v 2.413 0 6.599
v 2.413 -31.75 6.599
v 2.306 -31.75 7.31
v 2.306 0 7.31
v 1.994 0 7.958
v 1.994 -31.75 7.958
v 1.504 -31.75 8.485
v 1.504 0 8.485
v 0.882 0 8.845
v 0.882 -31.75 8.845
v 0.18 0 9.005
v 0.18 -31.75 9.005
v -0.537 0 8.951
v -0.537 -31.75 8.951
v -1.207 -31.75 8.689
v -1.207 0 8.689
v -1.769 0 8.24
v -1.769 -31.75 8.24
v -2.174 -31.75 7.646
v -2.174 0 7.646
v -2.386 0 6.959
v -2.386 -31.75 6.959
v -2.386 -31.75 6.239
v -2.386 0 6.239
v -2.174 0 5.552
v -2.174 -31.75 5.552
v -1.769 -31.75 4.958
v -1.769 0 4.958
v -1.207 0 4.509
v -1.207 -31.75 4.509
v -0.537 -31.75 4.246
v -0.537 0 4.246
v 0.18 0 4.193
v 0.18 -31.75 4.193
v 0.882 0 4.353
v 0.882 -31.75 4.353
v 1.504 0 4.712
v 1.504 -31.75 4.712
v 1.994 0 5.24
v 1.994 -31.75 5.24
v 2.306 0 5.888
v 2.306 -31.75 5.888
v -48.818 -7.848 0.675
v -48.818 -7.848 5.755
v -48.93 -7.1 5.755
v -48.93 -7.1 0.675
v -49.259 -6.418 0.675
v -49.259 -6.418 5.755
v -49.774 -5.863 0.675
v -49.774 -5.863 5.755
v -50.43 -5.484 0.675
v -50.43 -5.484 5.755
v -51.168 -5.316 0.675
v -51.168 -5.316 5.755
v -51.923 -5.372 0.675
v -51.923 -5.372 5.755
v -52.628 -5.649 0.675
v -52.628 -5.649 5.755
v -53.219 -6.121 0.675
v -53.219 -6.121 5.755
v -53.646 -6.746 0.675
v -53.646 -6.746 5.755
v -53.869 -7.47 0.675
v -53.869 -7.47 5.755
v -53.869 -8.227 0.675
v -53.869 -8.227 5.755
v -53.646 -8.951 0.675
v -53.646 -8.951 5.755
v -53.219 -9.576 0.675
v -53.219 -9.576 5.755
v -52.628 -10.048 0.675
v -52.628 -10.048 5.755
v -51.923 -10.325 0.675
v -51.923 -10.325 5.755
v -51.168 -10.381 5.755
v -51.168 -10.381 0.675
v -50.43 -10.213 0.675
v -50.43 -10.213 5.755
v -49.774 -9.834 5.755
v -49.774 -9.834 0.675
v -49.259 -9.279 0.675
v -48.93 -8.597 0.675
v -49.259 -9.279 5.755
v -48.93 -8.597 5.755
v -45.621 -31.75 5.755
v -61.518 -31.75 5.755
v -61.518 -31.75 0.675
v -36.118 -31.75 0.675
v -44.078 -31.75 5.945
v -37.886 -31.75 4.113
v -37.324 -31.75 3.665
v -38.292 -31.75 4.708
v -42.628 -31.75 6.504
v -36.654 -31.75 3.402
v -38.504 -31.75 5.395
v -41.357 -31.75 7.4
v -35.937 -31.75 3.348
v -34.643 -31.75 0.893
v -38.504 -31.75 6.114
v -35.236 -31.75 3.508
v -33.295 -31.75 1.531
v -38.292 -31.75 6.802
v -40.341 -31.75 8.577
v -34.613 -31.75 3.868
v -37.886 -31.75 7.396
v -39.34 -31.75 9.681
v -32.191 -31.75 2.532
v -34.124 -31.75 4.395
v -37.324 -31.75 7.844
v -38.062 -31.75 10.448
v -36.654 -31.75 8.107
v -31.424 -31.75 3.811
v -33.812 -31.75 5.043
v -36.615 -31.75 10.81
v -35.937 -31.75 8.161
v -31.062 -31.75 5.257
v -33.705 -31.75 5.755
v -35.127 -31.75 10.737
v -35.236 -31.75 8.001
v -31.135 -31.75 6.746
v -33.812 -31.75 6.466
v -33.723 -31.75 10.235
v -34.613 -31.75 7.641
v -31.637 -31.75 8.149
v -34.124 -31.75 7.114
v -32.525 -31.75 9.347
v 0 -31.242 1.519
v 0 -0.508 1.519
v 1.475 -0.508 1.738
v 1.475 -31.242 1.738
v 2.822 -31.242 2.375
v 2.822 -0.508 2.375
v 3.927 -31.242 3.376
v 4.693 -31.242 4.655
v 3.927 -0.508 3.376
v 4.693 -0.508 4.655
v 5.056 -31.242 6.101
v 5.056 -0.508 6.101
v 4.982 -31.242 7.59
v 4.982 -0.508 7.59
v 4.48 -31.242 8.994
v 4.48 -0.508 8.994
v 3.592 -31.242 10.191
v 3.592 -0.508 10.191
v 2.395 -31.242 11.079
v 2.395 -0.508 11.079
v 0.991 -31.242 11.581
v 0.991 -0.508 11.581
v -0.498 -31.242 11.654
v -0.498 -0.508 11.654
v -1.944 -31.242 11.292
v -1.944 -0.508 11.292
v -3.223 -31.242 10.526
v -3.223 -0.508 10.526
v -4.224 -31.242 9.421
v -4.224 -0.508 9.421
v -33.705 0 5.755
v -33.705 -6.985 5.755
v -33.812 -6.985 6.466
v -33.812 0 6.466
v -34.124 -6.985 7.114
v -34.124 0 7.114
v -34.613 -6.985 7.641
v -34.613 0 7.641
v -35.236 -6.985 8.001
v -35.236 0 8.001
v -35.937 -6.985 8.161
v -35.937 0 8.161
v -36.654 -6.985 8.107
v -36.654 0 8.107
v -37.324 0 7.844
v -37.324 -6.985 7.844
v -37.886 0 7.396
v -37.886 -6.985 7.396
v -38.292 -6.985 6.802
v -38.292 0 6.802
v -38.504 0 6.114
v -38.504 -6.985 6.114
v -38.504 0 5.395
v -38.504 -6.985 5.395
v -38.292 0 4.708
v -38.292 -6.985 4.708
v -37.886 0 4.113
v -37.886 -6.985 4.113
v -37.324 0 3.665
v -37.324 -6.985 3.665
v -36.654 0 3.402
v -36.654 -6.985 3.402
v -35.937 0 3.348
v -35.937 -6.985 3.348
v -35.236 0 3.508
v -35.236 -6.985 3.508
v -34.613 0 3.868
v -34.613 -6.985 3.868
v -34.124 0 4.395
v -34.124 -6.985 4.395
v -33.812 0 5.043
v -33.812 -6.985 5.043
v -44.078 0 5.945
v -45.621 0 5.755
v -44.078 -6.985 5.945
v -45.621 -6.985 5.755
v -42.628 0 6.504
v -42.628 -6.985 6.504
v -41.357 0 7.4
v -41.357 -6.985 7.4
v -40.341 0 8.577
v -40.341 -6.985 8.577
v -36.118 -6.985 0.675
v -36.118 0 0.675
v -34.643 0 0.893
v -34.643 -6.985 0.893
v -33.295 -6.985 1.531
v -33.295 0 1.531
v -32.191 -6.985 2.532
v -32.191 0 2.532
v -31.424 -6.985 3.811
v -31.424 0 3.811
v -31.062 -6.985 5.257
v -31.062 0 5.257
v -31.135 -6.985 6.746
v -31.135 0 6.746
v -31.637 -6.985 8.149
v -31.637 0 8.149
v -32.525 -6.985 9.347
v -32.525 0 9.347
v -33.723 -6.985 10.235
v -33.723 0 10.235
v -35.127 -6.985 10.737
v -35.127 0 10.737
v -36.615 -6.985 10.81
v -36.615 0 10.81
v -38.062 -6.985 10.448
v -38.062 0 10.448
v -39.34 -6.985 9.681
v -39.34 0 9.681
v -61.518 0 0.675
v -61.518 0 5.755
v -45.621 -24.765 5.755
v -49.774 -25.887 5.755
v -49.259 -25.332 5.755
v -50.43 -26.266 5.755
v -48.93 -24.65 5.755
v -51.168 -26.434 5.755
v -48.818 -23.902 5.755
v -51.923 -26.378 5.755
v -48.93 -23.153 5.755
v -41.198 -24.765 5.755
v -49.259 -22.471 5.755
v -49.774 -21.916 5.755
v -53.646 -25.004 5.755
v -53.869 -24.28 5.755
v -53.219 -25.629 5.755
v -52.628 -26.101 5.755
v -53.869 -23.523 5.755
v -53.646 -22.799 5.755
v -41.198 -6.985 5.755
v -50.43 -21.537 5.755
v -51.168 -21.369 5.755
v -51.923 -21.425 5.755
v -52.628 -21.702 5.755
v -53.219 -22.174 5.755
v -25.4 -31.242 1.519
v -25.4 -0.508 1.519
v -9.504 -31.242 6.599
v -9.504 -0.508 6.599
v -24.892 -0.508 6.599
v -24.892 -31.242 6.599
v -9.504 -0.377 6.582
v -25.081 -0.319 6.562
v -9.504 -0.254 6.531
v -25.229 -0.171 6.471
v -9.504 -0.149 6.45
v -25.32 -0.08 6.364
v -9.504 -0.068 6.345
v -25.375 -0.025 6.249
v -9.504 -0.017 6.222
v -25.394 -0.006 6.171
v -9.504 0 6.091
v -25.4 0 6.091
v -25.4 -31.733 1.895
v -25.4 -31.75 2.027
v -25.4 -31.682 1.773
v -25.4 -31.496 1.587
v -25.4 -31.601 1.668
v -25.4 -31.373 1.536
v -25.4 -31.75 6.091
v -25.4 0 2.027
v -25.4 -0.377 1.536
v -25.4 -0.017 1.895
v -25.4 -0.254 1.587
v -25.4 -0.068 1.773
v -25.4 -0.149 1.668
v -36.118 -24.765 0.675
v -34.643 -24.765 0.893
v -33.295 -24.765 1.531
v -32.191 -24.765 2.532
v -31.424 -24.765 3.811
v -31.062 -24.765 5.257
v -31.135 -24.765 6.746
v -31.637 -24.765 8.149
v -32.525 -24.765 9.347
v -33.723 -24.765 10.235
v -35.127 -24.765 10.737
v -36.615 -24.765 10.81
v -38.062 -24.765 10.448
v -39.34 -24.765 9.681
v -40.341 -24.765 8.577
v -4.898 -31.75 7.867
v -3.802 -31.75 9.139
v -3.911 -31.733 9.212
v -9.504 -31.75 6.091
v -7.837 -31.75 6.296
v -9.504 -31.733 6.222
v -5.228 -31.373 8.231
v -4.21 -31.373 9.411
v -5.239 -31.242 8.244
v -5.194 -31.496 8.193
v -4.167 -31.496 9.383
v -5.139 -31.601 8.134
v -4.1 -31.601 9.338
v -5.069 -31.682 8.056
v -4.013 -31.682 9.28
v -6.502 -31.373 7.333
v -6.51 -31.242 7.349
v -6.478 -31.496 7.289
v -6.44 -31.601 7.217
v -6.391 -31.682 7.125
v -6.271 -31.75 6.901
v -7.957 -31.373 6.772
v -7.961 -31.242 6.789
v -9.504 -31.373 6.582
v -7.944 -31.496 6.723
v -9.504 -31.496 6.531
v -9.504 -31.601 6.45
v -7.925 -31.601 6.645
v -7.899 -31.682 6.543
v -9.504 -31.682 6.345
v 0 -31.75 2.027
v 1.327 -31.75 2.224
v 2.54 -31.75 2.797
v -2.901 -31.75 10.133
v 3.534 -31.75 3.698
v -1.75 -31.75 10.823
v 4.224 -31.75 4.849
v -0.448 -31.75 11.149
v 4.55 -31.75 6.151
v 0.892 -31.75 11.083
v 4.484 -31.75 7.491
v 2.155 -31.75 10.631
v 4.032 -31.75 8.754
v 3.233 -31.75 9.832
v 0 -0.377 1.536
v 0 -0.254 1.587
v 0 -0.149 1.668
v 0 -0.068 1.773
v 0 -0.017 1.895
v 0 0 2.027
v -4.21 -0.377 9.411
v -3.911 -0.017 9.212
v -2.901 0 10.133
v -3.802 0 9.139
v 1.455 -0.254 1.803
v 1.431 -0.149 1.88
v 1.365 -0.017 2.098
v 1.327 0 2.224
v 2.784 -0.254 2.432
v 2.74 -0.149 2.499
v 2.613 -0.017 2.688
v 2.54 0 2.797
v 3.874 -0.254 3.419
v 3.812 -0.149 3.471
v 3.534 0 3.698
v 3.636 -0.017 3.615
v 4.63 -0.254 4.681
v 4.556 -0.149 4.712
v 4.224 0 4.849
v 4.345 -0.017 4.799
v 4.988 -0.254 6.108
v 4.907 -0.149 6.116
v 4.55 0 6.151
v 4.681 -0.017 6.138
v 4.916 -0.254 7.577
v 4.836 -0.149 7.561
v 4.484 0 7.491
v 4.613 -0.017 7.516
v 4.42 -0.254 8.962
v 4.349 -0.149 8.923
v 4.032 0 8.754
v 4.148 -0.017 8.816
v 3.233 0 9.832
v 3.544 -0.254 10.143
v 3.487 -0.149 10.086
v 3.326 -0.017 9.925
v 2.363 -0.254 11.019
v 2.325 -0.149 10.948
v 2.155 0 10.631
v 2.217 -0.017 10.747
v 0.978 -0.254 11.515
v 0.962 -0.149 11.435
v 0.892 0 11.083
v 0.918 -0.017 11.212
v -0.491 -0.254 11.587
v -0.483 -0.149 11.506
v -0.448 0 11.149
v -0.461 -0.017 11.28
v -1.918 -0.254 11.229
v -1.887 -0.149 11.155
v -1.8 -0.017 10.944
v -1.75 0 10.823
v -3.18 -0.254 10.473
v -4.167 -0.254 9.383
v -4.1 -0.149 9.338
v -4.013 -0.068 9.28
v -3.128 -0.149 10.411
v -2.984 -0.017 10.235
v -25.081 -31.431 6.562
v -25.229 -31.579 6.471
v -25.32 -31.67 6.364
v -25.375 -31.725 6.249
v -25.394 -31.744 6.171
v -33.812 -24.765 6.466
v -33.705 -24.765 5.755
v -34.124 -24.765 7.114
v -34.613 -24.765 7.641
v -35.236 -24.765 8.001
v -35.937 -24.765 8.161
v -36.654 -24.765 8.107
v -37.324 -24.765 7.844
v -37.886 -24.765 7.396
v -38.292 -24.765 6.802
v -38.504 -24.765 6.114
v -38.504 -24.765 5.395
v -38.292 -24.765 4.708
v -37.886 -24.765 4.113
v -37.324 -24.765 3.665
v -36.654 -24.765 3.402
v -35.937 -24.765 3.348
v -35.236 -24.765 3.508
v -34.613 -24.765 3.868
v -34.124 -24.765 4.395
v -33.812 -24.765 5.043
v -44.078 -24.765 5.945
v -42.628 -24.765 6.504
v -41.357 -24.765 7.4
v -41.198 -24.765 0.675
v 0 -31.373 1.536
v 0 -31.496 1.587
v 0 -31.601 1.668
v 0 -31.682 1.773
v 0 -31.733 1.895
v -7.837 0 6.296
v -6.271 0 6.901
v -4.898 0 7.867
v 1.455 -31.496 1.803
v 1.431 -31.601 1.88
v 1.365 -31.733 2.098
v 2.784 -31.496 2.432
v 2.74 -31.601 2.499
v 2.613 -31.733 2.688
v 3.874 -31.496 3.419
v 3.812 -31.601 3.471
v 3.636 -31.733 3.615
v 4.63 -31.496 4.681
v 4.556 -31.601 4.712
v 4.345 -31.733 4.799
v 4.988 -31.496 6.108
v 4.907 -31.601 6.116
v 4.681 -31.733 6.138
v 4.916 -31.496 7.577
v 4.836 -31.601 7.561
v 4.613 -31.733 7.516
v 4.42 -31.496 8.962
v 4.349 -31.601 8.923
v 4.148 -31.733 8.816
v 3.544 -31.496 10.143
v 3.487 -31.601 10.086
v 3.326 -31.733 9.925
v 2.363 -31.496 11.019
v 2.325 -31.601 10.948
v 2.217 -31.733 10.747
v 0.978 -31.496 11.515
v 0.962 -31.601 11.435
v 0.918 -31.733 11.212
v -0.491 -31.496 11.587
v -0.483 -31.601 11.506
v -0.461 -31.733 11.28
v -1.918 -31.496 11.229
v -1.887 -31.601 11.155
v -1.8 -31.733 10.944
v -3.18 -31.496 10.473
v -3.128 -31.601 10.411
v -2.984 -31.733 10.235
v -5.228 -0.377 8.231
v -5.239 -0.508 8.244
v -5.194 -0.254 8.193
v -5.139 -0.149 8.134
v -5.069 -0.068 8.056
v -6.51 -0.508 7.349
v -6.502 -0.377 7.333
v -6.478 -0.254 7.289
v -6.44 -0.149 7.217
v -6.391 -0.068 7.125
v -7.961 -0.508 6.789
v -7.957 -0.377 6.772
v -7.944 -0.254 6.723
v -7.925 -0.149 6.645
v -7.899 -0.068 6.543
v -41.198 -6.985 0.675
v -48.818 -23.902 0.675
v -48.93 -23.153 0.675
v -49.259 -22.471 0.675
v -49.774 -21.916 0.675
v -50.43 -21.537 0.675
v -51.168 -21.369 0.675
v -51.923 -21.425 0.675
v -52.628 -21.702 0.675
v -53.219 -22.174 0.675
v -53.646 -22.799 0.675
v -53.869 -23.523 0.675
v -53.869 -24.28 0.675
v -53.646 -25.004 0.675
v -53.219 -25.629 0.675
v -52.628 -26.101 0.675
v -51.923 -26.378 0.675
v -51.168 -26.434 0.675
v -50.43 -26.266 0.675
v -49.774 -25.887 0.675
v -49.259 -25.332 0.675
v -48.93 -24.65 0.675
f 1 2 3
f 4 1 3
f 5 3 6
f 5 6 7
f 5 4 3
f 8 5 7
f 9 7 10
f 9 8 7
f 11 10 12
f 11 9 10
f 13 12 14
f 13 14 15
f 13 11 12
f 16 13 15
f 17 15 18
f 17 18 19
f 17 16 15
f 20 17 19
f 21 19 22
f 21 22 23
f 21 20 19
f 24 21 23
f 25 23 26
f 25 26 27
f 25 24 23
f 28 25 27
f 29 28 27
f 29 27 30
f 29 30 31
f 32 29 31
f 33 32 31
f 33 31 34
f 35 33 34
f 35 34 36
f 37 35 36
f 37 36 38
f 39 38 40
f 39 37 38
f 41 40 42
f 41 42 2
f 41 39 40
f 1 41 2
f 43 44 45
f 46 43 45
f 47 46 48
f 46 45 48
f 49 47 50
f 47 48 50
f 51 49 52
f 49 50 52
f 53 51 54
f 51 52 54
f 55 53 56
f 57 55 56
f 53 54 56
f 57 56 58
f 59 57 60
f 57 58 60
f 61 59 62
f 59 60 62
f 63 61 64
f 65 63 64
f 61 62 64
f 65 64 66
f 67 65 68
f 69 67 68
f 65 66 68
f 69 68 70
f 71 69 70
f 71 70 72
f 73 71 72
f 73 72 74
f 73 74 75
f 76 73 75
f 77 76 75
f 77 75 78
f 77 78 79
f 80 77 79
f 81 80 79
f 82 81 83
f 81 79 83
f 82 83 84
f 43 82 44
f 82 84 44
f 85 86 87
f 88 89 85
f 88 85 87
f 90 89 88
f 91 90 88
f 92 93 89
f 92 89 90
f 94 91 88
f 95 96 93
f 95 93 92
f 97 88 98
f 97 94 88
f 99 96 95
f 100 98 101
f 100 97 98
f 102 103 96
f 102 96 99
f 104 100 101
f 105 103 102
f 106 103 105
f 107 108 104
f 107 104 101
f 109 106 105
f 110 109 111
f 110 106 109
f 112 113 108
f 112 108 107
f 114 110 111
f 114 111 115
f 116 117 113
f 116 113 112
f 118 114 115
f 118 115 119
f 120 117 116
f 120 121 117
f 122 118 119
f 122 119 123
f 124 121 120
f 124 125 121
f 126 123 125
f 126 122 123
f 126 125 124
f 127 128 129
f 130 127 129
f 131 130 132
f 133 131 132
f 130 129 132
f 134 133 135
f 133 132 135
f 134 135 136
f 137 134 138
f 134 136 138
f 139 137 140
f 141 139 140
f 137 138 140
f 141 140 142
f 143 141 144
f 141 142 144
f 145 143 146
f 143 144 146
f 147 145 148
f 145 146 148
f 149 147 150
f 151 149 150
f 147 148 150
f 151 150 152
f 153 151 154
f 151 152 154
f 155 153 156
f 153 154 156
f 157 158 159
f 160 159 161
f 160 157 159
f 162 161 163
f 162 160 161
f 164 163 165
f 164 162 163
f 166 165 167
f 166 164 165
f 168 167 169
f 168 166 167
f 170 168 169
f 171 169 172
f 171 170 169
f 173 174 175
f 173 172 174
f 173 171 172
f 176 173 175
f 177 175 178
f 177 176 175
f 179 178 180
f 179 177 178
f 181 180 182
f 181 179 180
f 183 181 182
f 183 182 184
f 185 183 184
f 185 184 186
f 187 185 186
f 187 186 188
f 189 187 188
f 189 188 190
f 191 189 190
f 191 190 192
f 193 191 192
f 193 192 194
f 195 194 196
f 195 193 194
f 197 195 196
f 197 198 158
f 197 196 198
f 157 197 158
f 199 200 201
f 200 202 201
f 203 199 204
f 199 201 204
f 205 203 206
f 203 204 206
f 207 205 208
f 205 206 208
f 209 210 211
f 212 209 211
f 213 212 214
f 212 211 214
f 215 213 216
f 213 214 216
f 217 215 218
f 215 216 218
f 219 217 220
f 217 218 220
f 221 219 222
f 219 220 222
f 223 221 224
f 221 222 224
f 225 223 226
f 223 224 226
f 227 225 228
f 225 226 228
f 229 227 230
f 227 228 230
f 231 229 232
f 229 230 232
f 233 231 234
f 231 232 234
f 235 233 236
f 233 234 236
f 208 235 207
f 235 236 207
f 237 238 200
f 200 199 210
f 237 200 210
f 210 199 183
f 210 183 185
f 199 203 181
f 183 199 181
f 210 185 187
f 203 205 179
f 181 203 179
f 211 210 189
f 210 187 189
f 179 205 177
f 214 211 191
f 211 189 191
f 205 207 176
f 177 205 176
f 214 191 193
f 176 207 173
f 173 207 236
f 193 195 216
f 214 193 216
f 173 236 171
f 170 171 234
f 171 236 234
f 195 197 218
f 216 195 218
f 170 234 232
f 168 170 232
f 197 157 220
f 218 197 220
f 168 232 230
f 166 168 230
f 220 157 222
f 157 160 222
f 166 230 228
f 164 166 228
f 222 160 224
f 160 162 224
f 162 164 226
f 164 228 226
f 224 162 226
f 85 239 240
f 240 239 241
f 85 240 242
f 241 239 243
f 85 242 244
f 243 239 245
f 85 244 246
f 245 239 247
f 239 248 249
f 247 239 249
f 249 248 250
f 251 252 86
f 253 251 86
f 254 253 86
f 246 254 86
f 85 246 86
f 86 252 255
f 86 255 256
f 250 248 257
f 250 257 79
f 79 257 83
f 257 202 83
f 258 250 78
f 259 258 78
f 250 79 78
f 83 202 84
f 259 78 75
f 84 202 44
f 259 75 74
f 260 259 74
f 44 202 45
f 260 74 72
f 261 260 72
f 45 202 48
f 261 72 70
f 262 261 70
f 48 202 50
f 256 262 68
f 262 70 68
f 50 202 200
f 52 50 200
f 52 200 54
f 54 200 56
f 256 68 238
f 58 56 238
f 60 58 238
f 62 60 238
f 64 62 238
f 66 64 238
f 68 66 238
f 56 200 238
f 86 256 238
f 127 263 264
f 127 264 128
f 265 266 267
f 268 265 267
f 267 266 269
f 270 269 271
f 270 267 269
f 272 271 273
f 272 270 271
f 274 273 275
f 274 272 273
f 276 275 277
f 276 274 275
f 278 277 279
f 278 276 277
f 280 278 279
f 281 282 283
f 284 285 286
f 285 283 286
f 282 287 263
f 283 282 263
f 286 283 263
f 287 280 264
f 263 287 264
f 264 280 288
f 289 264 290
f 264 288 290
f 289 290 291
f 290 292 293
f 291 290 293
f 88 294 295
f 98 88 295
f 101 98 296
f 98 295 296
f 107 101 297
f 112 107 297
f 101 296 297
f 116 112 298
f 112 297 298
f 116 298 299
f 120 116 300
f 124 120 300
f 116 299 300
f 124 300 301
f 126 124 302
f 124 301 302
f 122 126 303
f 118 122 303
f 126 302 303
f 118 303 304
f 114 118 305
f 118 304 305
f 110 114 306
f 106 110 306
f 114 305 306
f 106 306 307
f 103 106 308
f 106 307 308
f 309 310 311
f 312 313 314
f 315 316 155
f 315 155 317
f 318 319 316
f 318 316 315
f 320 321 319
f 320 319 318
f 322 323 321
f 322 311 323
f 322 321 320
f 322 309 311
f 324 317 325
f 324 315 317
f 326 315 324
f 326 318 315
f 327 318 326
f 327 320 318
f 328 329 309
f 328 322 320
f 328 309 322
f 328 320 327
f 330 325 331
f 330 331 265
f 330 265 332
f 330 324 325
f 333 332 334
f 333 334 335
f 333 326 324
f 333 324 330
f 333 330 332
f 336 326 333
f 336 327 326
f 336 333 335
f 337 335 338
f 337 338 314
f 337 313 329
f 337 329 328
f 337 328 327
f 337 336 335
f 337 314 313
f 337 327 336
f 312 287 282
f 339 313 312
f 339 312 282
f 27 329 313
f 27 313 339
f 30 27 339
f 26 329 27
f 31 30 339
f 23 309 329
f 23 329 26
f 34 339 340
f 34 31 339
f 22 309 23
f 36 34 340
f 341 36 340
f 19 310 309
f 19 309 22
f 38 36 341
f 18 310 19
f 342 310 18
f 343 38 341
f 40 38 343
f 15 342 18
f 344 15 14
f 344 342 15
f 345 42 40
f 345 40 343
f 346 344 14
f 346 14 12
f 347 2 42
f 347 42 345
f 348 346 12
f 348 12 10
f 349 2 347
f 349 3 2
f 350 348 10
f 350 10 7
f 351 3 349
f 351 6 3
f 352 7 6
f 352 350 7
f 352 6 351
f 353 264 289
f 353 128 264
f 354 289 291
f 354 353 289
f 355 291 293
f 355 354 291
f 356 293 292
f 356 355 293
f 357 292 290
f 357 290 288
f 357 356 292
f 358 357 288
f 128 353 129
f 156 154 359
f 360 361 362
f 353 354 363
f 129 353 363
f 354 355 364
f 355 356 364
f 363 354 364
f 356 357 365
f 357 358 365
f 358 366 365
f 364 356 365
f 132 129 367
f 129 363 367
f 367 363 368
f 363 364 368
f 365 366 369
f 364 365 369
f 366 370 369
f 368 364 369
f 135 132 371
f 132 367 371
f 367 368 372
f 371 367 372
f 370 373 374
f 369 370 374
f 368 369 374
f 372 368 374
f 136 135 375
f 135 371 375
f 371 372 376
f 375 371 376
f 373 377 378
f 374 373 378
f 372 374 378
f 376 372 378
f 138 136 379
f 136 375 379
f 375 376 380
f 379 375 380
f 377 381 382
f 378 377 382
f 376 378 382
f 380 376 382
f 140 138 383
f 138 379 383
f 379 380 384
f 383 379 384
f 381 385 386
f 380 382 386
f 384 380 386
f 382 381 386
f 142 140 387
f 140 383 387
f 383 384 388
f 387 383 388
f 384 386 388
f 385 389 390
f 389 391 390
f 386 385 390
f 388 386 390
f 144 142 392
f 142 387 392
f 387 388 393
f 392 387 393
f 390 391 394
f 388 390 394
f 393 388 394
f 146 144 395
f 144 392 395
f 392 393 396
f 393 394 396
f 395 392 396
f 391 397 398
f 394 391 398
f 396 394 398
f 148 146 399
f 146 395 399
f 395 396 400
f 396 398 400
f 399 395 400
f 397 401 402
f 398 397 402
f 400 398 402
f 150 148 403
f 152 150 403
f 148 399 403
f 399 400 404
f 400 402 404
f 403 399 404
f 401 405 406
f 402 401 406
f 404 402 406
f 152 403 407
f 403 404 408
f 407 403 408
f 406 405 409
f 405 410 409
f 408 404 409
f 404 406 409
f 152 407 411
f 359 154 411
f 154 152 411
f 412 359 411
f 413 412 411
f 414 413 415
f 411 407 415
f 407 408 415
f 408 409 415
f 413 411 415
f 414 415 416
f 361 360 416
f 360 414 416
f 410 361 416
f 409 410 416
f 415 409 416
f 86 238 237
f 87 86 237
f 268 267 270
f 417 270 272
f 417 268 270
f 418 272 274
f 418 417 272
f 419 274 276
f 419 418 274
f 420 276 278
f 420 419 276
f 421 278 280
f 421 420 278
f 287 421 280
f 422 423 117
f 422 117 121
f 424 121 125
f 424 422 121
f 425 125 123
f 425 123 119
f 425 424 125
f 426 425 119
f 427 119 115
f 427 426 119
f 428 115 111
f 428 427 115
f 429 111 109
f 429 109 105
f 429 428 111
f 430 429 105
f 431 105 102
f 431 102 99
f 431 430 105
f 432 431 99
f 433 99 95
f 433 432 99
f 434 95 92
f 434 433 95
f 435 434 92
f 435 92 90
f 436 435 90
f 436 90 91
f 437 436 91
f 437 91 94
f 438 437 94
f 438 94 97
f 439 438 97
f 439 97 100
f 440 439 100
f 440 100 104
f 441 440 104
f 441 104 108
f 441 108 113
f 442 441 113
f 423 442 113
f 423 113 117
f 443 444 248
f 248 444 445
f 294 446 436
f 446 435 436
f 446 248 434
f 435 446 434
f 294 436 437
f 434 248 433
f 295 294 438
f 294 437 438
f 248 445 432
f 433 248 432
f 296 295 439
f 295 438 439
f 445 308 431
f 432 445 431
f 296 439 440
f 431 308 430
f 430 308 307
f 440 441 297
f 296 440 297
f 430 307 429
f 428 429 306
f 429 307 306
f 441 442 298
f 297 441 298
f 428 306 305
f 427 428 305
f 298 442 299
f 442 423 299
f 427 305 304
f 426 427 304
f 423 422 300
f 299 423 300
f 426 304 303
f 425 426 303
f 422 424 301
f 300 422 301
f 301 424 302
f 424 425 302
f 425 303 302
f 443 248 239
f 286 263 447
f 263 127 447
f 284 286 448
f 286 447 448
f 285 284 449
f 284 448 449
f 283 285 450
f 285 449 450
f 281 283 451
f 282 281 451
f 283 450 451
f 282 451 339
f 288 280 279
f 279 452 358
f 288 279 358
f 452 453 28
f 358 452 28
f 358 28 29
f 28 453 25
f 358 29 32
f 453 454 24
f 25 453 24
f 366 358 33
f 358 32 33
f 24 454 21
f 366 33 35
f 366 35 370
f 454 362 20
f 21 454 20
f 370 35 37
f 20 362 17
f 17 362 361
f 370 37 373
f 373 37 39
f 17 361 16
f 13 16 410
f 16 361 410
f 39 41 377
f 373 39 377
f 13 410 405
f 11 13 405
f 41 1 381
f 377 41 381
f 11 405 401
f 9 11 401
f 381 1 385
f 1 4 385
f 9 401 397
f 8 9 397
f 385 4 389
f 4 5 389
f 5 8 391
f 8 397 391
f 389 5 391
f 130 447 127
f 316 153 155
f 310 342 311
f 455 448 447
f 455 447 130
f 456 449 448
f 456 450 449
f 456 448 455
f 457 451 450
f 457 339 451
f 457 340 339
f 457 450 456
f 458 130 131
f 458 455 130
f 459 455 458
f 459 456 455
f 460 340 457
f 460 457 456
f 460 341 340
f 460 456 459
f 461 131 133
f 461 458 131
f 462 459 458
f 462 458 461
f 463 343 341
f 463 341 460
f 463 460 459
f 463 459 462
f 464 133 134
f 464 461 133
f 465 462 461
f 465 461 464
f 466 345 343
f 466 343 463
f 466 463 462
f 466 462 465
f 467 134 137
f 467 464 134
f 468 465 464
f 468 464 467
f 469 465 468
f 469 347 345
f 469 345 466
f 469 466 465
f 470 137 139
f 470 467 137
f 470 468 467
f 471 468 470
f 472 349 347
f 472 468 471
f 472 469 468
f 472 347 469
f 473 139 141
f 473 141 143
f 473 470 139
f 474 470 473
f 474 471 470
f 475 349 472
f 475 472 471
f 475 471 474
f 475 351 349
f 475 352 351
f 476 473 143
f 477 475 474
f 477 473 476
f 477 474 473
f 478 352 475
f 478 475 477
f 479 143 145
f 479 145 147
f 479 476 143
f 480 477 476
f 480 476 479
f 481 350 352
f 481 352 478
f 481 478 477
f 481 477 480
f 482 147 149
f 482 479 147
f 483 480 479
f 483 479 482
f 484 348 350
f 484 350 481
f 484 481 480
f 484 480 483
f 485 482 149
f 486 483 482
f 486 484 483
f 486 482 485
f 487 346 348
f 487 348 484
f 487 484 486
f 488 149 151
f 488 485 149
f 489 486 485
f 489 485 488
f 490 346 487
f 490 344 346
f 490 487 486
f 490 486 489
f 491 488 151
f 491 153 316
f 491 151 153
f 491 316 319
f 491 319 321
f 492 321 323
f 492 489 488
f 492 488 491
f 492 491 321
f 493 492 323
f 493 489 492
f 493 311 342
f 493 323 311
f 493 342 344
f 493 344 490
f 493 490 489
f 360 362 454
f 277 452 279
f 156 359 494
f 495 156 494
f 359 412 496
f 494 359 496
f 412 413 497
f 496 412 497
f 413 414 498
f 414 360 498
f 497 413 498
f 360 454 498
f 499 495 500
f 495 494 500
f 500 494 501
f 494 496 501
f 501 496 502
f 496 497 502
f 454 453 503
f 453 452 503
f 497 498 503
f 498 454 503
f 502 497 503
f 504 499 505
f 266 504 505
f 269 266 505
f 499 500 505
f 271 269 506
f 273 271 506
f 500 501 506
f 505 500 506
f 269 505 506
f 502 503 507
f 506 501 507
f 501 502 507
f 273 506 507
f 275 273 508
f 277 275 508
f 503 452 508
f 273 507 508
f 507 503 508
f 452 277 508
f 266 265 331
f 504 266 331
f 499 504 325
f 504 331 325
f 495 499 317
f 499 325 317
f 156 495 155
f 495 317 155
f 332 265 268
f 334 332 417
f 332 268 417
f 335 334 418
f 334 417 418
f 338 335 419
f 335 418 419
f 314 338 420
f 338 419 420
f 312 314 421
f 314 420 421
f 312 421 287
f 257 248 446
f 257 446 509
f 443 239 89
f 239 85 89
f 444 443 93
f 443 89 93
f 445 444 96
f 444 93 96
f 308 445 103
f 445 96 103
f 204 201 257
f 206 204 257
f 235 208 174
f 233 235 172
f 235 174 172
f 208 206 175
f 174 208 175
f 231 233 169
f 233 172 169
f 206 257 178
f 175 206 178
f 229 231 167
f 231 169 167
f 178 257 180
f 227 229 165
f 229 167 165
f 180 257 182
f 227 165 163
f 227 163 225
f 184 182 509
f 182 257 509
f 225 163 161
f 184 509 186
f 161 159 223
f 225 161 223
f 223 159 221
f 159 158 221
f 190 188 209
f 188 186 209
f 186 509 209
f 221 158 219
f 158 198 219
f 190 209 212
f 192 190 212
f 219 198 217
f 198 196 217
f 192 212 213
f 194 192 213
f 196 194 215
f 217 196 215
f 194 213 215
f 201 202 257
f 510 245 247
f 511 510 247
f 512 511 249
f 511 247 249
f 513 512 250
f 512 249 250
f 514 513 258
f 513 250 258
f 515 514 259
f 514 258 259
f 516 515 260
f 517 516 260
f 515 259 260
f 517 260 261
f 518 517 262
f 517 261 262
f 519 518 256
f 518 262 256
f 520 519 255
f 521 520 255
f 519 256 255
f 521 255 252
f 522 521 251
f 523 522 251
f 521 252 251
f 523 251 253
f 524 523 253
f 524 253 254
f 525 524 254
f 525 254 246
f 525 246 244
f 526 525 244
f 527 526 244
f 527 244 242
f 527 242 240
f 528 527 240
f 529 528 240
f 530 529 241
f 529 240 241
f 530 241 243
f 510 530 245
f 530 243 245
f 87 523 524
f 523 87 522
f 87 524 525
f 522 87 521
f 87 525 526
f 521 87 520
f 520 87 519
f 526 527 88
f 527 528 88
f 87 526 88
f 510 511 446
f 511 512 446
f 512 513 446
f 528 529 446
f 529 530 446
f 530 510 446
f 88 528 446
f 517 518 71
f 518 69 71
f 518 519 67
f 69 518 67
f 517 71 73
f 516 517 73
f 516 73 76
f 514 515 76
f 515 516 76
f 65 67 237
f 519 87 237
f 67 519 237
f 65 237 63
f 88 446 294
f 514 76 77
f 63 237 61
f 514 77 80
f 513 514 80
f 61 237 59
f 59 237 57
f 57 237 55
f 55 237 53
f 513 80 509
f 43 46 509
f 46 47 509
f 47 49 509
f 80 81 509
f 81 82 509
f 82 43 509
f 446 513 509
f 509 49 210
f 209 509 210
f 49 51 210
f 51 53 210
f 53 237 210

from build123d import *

# Parameters (mm, degrees)
F0_R          = 2.413
F1_DEPTH      = 31.75
F2_W          = 10.16
F2_H          = 17.78
F3_DEPTH      = 5.08
F3_DEPTH_BACK = 107
F4_R          = 2.54
F5_DEPTH      = 5.08
F6_R          = 6.35
F6_2_R        = 6.35
F7_R          = 0.508


# Not quite as in the source:
# - an extrude ends at something that could not be found from the text; its depth is read off the source's solid


with BuildPart() as f1:
    # F0 (on Front) → F1 (new body)
    with BuildSketch(Plane.XZ):
        with BuildLine():
            Line((-41.1975002551, 5.7546137058), (-61.5175002551, 5.7546137058))
            Line((-61.5175002551, 5.7546137058), (-61.5175002551, 0.6746137058))
            Line((-61.5175002551, 0.6746137058), (-36.1175002551, 0.6746137058))
            ThreePointArc((-36.1175002551, 0.6746137058), (-32.5253978067, 9.3467161542), (-41.1975002551, 5.7546137058))
        make_face()
        with Locations((-36.1175002551, 5.7546137058)):
            Circle(F0_R, mode=Mode.SUBTRACT)
    extrude(amount=F1_DEPTH)

    # F2 (on face) → F3 (cut, two sides)
    with BuildSketch(Plane.XY.offset(5.7546137058)) as f3_sk:
        with Locations((-36.1175002551, -15.875)):
            Rectangle(F2_W, F2_H)
    extrude(amount=-F3_DEPTH, mode=Mode.SUBTRACT)
    extrude(f3_sk.sketch, amount=F3_DEPTH_BACK, mode=Mode.SUBTRACT)

    # F4 (on face) → F5 (cut, through all)
    with BuildSketch(Plane.XY.offset(5.7546137058)):
        with Locations((-51.3575002551, -7.8484792235)):
            Circle(F4_R)
        with Locations((-51.3575002551, -23.9015207765)):
            Circle(F4_R)
    extrude(amount=-F5_DEPTH, mode=Mode.SUBTRACT)

    # F6#2
    f6_2_edges = [f1.edges().sort_by_distance(p)[0] for p in [
        (-41.1975, -3.4925, 5.754614),
        (-41.1975, -28.2575, 5.754614),
    ]]
    fillet(f6_2_edges, radius=F6_2_R)


with BuildPart() as f1b:
    # F0 (on Front) → F1, piece 2 (new body)
    with BuildSketch(Plane.XZ):
        with BuildLine():
            Line((-5.08, 6.5988614224), (-25.4, 6.5988614224))
            Line((-25.4, 6.5988614224), (-25.4, 1.5188614224))
            Line((-25.4, 1.5188614224), (0, 1.5188614224))
            ThreePointArc((0, 1.5188614224), (3.5921024484, 10.1909638708), (-5.08, 6.5988614224))
        make_face()
        with Locations((0, 6.5988614224)):
            Circle(F0_R, mode=Mode.SUBTRACT)
    extrude(amount=F1_DEPTH)

    # F6
    f6_edges = [f1b.edges().sort_by_distance(p)[0] for p in [
        (-5.08, -15.875, 6.598861),
    ]]
    fillet(f6_edges, radius=F6_R)

    # F7
    f7_edges = [f1b.edges().sort_by_distance(p)[0] for p in [
        (-17.451905, -31.75, 6.598861),
        (-17.451905, 0, 6.598861),
        (-25.4, -15.875, 6.598861),
        (4.480139, 0, 8.993596),
        (4.480139, -31.75, 8.993596),
        (-6.510391, 0, 7.348688),
        (-12.7, 0, 1.518861),
        (-6.510391, -31.75, 7.348688),
        (-12.7, -31.75, 1.518861),
    ]]
    fillet(f7_edges, radius=F7_R)


solid = Compound([f1.part, f1b.part])
